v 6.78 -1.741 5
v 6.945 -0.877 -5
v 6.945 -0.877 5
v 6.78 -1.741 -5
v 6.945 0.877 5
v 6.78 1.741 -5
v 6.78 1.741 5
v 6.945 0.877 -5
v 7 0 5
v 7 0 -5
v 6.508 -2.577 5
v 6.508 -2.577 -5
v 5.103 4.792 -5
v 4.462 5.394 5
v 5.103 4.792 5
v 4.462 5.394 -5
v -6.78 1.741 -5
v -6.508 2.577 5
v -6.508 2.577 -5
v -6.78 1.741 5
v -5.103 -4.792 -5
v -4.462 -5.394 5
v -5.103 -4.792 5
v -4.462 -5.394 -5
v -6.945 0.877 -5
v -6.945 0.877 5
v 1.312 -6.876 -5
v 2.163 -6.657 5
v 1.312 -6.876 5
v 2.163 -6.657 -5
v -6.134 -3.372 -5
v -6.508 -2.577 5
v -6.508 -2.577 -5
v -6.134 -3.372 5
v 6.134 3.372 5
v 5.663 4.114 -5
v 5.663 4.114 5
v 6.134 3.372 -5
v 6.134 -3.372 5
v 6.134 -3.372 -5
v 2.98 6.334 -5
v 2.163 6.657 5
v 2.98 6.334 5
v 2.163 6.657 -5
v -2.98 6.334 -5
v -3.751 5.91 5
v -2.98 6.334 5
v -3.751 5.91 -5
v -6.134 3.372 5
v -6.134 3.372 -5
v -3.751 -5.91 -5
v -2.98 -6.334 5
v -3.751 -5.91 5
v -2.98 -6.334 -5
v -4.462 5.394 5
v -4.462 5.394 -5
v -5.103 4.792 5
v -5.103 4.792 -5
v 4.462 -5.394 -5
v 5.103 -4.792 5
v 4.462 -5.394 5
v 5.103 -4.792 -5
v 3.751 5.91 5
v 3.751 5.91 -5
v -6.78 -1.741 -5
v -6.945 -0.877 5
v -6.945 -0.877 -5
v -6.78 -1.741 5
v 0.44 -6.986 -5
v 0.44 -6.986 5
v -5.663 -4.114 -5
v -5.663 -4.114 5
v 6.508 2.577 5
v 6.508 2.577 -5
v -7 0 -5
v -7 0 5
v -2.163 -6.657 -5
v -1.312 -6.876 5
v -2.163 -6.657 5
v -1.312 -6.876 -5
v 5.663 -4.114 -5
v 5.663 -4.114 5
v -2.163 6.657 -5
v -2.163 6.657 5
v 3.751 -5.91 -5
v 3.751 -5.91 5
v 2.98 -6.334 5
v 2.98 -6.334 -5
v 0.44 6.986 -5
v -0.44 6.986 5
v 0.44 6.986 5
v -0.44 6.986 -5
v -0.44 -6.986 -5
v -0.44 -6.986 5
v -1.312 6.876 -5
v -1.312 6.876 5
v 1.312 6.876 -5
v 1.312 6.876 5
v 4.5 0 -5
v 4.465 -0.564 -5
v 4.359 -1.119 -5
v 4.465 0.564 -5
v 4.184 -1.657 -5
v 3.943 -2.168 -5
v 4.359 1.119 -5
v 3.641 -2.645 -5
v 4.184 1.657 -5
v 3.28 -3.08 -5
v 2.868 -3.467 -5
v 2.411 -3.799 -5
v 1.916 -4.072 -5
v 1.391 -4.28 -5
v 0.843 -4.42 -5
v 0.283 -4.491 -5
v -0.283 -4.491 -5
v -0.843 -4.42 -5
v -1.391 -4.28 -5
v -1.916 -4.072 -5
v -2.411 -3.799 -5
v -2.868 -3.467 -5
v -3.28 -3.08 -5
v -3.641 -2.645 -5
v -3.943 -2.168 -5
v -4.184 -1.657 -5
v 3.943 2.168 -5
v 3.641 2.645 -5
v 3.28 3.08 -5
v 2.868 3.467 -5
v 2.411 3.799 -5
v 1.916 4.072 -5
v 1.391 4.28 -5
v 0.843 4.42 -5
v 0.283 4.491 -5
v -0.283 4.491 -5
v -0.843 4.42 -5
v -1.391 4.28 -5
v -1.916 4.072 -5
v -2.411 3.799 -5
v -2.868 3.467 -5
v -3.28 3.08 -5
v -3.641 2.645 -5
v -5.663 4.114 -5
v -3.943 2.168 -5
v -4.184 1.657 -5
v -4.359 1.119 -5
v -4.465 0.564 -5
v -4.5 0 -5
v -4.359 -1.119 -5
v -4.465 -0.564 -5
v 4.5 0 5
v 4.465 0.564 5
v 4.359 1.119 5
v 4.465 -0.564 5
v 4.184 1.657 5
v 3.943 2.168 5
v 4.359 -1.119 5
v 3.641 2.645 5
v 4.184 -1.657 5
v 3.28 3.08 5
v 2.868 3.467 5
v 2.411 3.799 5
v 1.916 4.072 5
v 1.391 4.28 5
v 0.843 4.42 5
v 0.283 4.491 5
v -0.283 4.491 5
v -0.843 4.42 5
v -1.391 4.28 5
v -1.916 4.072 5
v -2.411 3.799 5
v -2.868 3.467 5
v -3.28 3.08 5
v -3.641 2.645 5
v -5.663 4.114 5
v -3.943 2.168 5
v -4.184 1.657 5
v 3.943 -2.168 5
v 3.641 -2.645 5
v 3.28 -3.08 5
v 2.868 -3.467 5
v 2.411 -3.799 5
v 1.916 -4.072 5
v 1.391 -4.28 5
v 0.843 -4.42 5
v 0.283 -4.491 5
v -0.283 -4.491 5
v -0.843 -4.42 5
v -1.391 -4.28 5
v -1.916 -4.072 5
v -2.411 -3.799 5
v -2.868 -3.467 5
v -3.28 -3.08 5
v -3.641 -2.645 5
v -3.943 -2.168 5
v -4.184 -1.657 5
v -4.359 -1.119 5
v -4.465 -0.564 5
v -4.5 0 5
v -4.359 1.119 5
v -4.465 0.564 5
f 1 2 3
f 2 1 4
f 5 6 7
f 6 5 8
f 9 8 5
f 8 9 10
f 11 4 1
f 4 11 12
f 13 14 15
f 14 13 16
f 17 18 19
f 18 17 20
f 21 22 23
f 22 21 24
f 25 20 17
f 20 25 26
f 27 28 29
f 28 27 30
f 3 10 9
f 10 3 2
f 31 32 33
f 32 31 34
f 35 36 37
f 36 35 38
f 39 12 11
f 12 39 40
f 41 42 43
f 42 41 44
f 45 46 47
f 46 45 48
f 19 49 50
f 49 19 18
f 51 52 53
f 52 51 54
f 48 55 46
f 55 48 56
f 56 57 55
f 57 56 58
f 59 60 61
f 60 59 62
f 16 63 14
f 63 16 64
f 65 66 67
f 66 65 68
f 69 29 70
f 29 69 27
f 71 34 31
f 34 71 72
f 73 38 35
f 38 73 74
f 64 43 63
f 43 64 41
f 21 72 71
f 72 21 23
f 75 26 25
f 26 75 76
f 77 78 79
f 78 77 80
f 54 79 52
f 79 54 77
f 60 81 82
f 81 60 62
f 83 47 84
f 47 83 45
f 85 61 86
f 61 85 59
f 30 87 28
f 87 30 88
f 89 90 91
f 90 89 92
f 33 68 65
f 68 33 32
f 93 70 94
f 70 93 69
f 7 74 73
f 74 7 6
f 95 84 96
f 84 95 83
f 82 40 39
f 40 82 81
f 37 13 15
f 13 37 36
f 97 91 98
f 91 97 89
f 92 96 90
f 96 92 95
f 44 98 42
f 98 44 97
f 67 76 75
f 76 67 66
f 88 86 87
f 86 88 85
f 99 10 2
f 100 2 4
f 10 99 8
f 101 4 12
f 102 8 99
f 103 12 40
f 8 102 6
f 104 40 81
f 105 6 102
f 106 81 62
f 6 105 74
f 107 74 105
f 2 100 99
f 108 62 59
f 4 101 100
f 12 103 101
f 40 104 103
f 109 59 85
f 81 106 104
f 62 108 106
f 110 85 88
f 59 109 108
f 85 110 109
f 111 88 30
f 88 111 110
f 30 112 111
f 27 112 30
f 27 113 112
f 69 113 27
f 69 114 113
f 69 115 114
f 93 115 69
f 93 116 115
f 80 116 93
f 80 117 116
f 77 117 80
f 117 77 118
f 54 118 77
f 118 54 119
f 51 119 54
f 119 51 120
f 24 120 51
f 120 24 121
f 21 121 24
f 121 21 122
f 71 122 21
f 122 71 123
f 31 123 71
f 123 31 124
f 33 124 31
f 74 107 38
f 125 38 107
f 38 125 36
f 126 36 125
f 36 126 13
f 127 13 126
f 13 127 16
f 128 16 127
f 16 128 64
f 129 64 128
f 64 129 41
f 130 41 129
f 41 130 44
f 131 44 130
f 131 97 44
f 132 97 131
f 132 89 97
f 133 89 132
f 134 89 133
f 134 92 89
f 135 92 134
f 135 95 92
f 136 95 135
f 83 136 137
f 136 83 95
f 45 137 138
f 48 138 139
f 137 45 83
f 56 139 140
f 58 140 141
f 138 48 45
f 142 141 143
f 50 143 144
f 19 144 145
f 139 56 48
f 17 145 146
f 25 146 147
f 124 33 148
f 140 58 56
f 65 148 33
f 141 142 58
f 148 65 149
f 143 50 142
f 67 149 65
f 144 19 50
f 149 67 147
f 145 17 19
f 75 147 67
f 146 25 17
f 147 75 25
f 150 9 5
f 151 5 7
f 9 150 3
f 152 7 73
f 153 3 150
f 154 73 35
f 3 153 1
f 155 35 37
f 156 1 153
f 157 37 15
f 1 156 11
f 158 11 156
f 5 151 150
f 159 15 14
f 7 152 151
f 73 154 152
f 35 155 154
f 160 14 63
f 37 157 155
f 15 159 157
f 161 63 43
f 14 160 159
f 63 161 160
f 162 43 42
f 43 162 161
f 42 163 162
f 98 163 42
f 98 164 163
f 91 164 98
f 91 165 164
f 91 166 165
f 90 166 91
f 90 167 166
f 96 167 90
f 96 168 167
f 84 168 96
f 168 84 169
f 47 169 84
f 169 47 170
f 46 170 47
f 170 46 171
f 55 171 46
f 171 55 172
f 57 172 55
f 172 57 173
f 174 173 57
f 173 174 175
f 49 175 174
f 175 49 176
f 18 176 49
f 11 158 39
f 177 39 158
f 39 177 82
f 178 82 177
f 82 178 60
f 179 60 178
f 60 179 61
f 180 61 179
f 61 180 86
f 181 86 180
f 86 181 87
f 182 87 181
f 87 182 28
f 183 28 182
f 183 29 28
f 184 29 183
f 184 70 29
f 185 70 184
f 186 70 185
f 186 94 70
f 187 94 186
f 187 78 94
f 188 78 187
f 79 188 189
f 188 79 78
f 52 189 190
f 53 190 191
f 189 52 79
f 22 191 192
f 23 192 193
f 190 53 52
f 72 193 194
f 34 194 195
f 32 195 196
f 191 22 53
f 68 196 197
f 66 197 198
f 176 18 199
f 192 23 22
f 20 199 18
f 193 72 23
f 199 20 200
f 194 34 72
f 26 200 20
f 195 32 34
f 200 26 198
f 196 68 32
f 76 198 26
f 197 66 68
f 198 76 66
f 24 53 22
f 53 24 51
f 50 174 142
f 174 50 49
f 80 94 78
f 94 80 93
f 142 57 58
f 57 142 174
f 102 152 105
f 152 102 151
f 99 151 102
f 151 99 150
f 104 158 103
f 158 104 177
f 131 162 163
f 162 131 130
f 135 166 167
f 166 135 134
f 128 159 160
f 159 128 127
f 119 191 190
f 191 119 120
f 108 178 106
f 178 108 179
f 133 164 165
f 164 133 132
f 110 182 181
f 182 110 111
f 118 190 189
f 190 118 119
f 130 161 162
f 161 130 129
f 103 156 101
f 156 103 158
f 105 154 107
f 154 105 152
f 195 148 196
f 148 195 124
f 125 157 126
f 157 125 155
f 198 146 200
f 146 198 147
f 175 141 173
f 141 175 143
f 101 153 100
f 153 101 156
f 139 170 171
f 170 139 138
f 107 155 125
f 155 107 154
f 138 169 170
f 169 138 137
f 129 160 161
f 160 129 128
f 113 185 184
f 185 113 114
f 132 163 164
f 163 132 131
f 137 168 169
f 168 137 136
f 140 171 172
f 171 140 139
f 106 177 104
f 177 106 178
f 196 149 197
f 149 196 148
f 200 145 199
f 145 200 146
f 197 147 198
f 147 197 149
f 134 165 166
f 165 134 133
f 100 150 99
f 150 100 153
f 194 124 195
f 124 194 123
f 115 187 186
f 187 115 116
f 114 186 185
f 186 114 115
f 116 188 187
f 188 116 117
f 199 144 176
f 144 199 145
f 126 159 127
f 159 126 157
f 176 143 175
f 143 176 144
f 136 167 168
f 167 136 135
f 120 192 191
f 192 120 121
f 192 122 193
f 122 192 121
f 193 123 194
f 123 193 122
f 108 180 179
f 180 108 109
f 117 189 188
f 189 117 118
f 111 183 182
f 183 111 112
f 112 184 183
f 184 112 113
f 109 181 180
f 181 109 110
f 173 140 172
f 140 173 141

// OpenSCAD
$fn = 50;


difference() {
	union() {
		translate(v = [0, 0, -5.0000000000]) {
			cylinder(h = 10, r = 7.0000000000);
		}
	}
	union() {
		translate(v = [0, 0, -100.0000000000]) {
			cylinder(h = 200, r = 4.5000000000);
		}
	}
}
